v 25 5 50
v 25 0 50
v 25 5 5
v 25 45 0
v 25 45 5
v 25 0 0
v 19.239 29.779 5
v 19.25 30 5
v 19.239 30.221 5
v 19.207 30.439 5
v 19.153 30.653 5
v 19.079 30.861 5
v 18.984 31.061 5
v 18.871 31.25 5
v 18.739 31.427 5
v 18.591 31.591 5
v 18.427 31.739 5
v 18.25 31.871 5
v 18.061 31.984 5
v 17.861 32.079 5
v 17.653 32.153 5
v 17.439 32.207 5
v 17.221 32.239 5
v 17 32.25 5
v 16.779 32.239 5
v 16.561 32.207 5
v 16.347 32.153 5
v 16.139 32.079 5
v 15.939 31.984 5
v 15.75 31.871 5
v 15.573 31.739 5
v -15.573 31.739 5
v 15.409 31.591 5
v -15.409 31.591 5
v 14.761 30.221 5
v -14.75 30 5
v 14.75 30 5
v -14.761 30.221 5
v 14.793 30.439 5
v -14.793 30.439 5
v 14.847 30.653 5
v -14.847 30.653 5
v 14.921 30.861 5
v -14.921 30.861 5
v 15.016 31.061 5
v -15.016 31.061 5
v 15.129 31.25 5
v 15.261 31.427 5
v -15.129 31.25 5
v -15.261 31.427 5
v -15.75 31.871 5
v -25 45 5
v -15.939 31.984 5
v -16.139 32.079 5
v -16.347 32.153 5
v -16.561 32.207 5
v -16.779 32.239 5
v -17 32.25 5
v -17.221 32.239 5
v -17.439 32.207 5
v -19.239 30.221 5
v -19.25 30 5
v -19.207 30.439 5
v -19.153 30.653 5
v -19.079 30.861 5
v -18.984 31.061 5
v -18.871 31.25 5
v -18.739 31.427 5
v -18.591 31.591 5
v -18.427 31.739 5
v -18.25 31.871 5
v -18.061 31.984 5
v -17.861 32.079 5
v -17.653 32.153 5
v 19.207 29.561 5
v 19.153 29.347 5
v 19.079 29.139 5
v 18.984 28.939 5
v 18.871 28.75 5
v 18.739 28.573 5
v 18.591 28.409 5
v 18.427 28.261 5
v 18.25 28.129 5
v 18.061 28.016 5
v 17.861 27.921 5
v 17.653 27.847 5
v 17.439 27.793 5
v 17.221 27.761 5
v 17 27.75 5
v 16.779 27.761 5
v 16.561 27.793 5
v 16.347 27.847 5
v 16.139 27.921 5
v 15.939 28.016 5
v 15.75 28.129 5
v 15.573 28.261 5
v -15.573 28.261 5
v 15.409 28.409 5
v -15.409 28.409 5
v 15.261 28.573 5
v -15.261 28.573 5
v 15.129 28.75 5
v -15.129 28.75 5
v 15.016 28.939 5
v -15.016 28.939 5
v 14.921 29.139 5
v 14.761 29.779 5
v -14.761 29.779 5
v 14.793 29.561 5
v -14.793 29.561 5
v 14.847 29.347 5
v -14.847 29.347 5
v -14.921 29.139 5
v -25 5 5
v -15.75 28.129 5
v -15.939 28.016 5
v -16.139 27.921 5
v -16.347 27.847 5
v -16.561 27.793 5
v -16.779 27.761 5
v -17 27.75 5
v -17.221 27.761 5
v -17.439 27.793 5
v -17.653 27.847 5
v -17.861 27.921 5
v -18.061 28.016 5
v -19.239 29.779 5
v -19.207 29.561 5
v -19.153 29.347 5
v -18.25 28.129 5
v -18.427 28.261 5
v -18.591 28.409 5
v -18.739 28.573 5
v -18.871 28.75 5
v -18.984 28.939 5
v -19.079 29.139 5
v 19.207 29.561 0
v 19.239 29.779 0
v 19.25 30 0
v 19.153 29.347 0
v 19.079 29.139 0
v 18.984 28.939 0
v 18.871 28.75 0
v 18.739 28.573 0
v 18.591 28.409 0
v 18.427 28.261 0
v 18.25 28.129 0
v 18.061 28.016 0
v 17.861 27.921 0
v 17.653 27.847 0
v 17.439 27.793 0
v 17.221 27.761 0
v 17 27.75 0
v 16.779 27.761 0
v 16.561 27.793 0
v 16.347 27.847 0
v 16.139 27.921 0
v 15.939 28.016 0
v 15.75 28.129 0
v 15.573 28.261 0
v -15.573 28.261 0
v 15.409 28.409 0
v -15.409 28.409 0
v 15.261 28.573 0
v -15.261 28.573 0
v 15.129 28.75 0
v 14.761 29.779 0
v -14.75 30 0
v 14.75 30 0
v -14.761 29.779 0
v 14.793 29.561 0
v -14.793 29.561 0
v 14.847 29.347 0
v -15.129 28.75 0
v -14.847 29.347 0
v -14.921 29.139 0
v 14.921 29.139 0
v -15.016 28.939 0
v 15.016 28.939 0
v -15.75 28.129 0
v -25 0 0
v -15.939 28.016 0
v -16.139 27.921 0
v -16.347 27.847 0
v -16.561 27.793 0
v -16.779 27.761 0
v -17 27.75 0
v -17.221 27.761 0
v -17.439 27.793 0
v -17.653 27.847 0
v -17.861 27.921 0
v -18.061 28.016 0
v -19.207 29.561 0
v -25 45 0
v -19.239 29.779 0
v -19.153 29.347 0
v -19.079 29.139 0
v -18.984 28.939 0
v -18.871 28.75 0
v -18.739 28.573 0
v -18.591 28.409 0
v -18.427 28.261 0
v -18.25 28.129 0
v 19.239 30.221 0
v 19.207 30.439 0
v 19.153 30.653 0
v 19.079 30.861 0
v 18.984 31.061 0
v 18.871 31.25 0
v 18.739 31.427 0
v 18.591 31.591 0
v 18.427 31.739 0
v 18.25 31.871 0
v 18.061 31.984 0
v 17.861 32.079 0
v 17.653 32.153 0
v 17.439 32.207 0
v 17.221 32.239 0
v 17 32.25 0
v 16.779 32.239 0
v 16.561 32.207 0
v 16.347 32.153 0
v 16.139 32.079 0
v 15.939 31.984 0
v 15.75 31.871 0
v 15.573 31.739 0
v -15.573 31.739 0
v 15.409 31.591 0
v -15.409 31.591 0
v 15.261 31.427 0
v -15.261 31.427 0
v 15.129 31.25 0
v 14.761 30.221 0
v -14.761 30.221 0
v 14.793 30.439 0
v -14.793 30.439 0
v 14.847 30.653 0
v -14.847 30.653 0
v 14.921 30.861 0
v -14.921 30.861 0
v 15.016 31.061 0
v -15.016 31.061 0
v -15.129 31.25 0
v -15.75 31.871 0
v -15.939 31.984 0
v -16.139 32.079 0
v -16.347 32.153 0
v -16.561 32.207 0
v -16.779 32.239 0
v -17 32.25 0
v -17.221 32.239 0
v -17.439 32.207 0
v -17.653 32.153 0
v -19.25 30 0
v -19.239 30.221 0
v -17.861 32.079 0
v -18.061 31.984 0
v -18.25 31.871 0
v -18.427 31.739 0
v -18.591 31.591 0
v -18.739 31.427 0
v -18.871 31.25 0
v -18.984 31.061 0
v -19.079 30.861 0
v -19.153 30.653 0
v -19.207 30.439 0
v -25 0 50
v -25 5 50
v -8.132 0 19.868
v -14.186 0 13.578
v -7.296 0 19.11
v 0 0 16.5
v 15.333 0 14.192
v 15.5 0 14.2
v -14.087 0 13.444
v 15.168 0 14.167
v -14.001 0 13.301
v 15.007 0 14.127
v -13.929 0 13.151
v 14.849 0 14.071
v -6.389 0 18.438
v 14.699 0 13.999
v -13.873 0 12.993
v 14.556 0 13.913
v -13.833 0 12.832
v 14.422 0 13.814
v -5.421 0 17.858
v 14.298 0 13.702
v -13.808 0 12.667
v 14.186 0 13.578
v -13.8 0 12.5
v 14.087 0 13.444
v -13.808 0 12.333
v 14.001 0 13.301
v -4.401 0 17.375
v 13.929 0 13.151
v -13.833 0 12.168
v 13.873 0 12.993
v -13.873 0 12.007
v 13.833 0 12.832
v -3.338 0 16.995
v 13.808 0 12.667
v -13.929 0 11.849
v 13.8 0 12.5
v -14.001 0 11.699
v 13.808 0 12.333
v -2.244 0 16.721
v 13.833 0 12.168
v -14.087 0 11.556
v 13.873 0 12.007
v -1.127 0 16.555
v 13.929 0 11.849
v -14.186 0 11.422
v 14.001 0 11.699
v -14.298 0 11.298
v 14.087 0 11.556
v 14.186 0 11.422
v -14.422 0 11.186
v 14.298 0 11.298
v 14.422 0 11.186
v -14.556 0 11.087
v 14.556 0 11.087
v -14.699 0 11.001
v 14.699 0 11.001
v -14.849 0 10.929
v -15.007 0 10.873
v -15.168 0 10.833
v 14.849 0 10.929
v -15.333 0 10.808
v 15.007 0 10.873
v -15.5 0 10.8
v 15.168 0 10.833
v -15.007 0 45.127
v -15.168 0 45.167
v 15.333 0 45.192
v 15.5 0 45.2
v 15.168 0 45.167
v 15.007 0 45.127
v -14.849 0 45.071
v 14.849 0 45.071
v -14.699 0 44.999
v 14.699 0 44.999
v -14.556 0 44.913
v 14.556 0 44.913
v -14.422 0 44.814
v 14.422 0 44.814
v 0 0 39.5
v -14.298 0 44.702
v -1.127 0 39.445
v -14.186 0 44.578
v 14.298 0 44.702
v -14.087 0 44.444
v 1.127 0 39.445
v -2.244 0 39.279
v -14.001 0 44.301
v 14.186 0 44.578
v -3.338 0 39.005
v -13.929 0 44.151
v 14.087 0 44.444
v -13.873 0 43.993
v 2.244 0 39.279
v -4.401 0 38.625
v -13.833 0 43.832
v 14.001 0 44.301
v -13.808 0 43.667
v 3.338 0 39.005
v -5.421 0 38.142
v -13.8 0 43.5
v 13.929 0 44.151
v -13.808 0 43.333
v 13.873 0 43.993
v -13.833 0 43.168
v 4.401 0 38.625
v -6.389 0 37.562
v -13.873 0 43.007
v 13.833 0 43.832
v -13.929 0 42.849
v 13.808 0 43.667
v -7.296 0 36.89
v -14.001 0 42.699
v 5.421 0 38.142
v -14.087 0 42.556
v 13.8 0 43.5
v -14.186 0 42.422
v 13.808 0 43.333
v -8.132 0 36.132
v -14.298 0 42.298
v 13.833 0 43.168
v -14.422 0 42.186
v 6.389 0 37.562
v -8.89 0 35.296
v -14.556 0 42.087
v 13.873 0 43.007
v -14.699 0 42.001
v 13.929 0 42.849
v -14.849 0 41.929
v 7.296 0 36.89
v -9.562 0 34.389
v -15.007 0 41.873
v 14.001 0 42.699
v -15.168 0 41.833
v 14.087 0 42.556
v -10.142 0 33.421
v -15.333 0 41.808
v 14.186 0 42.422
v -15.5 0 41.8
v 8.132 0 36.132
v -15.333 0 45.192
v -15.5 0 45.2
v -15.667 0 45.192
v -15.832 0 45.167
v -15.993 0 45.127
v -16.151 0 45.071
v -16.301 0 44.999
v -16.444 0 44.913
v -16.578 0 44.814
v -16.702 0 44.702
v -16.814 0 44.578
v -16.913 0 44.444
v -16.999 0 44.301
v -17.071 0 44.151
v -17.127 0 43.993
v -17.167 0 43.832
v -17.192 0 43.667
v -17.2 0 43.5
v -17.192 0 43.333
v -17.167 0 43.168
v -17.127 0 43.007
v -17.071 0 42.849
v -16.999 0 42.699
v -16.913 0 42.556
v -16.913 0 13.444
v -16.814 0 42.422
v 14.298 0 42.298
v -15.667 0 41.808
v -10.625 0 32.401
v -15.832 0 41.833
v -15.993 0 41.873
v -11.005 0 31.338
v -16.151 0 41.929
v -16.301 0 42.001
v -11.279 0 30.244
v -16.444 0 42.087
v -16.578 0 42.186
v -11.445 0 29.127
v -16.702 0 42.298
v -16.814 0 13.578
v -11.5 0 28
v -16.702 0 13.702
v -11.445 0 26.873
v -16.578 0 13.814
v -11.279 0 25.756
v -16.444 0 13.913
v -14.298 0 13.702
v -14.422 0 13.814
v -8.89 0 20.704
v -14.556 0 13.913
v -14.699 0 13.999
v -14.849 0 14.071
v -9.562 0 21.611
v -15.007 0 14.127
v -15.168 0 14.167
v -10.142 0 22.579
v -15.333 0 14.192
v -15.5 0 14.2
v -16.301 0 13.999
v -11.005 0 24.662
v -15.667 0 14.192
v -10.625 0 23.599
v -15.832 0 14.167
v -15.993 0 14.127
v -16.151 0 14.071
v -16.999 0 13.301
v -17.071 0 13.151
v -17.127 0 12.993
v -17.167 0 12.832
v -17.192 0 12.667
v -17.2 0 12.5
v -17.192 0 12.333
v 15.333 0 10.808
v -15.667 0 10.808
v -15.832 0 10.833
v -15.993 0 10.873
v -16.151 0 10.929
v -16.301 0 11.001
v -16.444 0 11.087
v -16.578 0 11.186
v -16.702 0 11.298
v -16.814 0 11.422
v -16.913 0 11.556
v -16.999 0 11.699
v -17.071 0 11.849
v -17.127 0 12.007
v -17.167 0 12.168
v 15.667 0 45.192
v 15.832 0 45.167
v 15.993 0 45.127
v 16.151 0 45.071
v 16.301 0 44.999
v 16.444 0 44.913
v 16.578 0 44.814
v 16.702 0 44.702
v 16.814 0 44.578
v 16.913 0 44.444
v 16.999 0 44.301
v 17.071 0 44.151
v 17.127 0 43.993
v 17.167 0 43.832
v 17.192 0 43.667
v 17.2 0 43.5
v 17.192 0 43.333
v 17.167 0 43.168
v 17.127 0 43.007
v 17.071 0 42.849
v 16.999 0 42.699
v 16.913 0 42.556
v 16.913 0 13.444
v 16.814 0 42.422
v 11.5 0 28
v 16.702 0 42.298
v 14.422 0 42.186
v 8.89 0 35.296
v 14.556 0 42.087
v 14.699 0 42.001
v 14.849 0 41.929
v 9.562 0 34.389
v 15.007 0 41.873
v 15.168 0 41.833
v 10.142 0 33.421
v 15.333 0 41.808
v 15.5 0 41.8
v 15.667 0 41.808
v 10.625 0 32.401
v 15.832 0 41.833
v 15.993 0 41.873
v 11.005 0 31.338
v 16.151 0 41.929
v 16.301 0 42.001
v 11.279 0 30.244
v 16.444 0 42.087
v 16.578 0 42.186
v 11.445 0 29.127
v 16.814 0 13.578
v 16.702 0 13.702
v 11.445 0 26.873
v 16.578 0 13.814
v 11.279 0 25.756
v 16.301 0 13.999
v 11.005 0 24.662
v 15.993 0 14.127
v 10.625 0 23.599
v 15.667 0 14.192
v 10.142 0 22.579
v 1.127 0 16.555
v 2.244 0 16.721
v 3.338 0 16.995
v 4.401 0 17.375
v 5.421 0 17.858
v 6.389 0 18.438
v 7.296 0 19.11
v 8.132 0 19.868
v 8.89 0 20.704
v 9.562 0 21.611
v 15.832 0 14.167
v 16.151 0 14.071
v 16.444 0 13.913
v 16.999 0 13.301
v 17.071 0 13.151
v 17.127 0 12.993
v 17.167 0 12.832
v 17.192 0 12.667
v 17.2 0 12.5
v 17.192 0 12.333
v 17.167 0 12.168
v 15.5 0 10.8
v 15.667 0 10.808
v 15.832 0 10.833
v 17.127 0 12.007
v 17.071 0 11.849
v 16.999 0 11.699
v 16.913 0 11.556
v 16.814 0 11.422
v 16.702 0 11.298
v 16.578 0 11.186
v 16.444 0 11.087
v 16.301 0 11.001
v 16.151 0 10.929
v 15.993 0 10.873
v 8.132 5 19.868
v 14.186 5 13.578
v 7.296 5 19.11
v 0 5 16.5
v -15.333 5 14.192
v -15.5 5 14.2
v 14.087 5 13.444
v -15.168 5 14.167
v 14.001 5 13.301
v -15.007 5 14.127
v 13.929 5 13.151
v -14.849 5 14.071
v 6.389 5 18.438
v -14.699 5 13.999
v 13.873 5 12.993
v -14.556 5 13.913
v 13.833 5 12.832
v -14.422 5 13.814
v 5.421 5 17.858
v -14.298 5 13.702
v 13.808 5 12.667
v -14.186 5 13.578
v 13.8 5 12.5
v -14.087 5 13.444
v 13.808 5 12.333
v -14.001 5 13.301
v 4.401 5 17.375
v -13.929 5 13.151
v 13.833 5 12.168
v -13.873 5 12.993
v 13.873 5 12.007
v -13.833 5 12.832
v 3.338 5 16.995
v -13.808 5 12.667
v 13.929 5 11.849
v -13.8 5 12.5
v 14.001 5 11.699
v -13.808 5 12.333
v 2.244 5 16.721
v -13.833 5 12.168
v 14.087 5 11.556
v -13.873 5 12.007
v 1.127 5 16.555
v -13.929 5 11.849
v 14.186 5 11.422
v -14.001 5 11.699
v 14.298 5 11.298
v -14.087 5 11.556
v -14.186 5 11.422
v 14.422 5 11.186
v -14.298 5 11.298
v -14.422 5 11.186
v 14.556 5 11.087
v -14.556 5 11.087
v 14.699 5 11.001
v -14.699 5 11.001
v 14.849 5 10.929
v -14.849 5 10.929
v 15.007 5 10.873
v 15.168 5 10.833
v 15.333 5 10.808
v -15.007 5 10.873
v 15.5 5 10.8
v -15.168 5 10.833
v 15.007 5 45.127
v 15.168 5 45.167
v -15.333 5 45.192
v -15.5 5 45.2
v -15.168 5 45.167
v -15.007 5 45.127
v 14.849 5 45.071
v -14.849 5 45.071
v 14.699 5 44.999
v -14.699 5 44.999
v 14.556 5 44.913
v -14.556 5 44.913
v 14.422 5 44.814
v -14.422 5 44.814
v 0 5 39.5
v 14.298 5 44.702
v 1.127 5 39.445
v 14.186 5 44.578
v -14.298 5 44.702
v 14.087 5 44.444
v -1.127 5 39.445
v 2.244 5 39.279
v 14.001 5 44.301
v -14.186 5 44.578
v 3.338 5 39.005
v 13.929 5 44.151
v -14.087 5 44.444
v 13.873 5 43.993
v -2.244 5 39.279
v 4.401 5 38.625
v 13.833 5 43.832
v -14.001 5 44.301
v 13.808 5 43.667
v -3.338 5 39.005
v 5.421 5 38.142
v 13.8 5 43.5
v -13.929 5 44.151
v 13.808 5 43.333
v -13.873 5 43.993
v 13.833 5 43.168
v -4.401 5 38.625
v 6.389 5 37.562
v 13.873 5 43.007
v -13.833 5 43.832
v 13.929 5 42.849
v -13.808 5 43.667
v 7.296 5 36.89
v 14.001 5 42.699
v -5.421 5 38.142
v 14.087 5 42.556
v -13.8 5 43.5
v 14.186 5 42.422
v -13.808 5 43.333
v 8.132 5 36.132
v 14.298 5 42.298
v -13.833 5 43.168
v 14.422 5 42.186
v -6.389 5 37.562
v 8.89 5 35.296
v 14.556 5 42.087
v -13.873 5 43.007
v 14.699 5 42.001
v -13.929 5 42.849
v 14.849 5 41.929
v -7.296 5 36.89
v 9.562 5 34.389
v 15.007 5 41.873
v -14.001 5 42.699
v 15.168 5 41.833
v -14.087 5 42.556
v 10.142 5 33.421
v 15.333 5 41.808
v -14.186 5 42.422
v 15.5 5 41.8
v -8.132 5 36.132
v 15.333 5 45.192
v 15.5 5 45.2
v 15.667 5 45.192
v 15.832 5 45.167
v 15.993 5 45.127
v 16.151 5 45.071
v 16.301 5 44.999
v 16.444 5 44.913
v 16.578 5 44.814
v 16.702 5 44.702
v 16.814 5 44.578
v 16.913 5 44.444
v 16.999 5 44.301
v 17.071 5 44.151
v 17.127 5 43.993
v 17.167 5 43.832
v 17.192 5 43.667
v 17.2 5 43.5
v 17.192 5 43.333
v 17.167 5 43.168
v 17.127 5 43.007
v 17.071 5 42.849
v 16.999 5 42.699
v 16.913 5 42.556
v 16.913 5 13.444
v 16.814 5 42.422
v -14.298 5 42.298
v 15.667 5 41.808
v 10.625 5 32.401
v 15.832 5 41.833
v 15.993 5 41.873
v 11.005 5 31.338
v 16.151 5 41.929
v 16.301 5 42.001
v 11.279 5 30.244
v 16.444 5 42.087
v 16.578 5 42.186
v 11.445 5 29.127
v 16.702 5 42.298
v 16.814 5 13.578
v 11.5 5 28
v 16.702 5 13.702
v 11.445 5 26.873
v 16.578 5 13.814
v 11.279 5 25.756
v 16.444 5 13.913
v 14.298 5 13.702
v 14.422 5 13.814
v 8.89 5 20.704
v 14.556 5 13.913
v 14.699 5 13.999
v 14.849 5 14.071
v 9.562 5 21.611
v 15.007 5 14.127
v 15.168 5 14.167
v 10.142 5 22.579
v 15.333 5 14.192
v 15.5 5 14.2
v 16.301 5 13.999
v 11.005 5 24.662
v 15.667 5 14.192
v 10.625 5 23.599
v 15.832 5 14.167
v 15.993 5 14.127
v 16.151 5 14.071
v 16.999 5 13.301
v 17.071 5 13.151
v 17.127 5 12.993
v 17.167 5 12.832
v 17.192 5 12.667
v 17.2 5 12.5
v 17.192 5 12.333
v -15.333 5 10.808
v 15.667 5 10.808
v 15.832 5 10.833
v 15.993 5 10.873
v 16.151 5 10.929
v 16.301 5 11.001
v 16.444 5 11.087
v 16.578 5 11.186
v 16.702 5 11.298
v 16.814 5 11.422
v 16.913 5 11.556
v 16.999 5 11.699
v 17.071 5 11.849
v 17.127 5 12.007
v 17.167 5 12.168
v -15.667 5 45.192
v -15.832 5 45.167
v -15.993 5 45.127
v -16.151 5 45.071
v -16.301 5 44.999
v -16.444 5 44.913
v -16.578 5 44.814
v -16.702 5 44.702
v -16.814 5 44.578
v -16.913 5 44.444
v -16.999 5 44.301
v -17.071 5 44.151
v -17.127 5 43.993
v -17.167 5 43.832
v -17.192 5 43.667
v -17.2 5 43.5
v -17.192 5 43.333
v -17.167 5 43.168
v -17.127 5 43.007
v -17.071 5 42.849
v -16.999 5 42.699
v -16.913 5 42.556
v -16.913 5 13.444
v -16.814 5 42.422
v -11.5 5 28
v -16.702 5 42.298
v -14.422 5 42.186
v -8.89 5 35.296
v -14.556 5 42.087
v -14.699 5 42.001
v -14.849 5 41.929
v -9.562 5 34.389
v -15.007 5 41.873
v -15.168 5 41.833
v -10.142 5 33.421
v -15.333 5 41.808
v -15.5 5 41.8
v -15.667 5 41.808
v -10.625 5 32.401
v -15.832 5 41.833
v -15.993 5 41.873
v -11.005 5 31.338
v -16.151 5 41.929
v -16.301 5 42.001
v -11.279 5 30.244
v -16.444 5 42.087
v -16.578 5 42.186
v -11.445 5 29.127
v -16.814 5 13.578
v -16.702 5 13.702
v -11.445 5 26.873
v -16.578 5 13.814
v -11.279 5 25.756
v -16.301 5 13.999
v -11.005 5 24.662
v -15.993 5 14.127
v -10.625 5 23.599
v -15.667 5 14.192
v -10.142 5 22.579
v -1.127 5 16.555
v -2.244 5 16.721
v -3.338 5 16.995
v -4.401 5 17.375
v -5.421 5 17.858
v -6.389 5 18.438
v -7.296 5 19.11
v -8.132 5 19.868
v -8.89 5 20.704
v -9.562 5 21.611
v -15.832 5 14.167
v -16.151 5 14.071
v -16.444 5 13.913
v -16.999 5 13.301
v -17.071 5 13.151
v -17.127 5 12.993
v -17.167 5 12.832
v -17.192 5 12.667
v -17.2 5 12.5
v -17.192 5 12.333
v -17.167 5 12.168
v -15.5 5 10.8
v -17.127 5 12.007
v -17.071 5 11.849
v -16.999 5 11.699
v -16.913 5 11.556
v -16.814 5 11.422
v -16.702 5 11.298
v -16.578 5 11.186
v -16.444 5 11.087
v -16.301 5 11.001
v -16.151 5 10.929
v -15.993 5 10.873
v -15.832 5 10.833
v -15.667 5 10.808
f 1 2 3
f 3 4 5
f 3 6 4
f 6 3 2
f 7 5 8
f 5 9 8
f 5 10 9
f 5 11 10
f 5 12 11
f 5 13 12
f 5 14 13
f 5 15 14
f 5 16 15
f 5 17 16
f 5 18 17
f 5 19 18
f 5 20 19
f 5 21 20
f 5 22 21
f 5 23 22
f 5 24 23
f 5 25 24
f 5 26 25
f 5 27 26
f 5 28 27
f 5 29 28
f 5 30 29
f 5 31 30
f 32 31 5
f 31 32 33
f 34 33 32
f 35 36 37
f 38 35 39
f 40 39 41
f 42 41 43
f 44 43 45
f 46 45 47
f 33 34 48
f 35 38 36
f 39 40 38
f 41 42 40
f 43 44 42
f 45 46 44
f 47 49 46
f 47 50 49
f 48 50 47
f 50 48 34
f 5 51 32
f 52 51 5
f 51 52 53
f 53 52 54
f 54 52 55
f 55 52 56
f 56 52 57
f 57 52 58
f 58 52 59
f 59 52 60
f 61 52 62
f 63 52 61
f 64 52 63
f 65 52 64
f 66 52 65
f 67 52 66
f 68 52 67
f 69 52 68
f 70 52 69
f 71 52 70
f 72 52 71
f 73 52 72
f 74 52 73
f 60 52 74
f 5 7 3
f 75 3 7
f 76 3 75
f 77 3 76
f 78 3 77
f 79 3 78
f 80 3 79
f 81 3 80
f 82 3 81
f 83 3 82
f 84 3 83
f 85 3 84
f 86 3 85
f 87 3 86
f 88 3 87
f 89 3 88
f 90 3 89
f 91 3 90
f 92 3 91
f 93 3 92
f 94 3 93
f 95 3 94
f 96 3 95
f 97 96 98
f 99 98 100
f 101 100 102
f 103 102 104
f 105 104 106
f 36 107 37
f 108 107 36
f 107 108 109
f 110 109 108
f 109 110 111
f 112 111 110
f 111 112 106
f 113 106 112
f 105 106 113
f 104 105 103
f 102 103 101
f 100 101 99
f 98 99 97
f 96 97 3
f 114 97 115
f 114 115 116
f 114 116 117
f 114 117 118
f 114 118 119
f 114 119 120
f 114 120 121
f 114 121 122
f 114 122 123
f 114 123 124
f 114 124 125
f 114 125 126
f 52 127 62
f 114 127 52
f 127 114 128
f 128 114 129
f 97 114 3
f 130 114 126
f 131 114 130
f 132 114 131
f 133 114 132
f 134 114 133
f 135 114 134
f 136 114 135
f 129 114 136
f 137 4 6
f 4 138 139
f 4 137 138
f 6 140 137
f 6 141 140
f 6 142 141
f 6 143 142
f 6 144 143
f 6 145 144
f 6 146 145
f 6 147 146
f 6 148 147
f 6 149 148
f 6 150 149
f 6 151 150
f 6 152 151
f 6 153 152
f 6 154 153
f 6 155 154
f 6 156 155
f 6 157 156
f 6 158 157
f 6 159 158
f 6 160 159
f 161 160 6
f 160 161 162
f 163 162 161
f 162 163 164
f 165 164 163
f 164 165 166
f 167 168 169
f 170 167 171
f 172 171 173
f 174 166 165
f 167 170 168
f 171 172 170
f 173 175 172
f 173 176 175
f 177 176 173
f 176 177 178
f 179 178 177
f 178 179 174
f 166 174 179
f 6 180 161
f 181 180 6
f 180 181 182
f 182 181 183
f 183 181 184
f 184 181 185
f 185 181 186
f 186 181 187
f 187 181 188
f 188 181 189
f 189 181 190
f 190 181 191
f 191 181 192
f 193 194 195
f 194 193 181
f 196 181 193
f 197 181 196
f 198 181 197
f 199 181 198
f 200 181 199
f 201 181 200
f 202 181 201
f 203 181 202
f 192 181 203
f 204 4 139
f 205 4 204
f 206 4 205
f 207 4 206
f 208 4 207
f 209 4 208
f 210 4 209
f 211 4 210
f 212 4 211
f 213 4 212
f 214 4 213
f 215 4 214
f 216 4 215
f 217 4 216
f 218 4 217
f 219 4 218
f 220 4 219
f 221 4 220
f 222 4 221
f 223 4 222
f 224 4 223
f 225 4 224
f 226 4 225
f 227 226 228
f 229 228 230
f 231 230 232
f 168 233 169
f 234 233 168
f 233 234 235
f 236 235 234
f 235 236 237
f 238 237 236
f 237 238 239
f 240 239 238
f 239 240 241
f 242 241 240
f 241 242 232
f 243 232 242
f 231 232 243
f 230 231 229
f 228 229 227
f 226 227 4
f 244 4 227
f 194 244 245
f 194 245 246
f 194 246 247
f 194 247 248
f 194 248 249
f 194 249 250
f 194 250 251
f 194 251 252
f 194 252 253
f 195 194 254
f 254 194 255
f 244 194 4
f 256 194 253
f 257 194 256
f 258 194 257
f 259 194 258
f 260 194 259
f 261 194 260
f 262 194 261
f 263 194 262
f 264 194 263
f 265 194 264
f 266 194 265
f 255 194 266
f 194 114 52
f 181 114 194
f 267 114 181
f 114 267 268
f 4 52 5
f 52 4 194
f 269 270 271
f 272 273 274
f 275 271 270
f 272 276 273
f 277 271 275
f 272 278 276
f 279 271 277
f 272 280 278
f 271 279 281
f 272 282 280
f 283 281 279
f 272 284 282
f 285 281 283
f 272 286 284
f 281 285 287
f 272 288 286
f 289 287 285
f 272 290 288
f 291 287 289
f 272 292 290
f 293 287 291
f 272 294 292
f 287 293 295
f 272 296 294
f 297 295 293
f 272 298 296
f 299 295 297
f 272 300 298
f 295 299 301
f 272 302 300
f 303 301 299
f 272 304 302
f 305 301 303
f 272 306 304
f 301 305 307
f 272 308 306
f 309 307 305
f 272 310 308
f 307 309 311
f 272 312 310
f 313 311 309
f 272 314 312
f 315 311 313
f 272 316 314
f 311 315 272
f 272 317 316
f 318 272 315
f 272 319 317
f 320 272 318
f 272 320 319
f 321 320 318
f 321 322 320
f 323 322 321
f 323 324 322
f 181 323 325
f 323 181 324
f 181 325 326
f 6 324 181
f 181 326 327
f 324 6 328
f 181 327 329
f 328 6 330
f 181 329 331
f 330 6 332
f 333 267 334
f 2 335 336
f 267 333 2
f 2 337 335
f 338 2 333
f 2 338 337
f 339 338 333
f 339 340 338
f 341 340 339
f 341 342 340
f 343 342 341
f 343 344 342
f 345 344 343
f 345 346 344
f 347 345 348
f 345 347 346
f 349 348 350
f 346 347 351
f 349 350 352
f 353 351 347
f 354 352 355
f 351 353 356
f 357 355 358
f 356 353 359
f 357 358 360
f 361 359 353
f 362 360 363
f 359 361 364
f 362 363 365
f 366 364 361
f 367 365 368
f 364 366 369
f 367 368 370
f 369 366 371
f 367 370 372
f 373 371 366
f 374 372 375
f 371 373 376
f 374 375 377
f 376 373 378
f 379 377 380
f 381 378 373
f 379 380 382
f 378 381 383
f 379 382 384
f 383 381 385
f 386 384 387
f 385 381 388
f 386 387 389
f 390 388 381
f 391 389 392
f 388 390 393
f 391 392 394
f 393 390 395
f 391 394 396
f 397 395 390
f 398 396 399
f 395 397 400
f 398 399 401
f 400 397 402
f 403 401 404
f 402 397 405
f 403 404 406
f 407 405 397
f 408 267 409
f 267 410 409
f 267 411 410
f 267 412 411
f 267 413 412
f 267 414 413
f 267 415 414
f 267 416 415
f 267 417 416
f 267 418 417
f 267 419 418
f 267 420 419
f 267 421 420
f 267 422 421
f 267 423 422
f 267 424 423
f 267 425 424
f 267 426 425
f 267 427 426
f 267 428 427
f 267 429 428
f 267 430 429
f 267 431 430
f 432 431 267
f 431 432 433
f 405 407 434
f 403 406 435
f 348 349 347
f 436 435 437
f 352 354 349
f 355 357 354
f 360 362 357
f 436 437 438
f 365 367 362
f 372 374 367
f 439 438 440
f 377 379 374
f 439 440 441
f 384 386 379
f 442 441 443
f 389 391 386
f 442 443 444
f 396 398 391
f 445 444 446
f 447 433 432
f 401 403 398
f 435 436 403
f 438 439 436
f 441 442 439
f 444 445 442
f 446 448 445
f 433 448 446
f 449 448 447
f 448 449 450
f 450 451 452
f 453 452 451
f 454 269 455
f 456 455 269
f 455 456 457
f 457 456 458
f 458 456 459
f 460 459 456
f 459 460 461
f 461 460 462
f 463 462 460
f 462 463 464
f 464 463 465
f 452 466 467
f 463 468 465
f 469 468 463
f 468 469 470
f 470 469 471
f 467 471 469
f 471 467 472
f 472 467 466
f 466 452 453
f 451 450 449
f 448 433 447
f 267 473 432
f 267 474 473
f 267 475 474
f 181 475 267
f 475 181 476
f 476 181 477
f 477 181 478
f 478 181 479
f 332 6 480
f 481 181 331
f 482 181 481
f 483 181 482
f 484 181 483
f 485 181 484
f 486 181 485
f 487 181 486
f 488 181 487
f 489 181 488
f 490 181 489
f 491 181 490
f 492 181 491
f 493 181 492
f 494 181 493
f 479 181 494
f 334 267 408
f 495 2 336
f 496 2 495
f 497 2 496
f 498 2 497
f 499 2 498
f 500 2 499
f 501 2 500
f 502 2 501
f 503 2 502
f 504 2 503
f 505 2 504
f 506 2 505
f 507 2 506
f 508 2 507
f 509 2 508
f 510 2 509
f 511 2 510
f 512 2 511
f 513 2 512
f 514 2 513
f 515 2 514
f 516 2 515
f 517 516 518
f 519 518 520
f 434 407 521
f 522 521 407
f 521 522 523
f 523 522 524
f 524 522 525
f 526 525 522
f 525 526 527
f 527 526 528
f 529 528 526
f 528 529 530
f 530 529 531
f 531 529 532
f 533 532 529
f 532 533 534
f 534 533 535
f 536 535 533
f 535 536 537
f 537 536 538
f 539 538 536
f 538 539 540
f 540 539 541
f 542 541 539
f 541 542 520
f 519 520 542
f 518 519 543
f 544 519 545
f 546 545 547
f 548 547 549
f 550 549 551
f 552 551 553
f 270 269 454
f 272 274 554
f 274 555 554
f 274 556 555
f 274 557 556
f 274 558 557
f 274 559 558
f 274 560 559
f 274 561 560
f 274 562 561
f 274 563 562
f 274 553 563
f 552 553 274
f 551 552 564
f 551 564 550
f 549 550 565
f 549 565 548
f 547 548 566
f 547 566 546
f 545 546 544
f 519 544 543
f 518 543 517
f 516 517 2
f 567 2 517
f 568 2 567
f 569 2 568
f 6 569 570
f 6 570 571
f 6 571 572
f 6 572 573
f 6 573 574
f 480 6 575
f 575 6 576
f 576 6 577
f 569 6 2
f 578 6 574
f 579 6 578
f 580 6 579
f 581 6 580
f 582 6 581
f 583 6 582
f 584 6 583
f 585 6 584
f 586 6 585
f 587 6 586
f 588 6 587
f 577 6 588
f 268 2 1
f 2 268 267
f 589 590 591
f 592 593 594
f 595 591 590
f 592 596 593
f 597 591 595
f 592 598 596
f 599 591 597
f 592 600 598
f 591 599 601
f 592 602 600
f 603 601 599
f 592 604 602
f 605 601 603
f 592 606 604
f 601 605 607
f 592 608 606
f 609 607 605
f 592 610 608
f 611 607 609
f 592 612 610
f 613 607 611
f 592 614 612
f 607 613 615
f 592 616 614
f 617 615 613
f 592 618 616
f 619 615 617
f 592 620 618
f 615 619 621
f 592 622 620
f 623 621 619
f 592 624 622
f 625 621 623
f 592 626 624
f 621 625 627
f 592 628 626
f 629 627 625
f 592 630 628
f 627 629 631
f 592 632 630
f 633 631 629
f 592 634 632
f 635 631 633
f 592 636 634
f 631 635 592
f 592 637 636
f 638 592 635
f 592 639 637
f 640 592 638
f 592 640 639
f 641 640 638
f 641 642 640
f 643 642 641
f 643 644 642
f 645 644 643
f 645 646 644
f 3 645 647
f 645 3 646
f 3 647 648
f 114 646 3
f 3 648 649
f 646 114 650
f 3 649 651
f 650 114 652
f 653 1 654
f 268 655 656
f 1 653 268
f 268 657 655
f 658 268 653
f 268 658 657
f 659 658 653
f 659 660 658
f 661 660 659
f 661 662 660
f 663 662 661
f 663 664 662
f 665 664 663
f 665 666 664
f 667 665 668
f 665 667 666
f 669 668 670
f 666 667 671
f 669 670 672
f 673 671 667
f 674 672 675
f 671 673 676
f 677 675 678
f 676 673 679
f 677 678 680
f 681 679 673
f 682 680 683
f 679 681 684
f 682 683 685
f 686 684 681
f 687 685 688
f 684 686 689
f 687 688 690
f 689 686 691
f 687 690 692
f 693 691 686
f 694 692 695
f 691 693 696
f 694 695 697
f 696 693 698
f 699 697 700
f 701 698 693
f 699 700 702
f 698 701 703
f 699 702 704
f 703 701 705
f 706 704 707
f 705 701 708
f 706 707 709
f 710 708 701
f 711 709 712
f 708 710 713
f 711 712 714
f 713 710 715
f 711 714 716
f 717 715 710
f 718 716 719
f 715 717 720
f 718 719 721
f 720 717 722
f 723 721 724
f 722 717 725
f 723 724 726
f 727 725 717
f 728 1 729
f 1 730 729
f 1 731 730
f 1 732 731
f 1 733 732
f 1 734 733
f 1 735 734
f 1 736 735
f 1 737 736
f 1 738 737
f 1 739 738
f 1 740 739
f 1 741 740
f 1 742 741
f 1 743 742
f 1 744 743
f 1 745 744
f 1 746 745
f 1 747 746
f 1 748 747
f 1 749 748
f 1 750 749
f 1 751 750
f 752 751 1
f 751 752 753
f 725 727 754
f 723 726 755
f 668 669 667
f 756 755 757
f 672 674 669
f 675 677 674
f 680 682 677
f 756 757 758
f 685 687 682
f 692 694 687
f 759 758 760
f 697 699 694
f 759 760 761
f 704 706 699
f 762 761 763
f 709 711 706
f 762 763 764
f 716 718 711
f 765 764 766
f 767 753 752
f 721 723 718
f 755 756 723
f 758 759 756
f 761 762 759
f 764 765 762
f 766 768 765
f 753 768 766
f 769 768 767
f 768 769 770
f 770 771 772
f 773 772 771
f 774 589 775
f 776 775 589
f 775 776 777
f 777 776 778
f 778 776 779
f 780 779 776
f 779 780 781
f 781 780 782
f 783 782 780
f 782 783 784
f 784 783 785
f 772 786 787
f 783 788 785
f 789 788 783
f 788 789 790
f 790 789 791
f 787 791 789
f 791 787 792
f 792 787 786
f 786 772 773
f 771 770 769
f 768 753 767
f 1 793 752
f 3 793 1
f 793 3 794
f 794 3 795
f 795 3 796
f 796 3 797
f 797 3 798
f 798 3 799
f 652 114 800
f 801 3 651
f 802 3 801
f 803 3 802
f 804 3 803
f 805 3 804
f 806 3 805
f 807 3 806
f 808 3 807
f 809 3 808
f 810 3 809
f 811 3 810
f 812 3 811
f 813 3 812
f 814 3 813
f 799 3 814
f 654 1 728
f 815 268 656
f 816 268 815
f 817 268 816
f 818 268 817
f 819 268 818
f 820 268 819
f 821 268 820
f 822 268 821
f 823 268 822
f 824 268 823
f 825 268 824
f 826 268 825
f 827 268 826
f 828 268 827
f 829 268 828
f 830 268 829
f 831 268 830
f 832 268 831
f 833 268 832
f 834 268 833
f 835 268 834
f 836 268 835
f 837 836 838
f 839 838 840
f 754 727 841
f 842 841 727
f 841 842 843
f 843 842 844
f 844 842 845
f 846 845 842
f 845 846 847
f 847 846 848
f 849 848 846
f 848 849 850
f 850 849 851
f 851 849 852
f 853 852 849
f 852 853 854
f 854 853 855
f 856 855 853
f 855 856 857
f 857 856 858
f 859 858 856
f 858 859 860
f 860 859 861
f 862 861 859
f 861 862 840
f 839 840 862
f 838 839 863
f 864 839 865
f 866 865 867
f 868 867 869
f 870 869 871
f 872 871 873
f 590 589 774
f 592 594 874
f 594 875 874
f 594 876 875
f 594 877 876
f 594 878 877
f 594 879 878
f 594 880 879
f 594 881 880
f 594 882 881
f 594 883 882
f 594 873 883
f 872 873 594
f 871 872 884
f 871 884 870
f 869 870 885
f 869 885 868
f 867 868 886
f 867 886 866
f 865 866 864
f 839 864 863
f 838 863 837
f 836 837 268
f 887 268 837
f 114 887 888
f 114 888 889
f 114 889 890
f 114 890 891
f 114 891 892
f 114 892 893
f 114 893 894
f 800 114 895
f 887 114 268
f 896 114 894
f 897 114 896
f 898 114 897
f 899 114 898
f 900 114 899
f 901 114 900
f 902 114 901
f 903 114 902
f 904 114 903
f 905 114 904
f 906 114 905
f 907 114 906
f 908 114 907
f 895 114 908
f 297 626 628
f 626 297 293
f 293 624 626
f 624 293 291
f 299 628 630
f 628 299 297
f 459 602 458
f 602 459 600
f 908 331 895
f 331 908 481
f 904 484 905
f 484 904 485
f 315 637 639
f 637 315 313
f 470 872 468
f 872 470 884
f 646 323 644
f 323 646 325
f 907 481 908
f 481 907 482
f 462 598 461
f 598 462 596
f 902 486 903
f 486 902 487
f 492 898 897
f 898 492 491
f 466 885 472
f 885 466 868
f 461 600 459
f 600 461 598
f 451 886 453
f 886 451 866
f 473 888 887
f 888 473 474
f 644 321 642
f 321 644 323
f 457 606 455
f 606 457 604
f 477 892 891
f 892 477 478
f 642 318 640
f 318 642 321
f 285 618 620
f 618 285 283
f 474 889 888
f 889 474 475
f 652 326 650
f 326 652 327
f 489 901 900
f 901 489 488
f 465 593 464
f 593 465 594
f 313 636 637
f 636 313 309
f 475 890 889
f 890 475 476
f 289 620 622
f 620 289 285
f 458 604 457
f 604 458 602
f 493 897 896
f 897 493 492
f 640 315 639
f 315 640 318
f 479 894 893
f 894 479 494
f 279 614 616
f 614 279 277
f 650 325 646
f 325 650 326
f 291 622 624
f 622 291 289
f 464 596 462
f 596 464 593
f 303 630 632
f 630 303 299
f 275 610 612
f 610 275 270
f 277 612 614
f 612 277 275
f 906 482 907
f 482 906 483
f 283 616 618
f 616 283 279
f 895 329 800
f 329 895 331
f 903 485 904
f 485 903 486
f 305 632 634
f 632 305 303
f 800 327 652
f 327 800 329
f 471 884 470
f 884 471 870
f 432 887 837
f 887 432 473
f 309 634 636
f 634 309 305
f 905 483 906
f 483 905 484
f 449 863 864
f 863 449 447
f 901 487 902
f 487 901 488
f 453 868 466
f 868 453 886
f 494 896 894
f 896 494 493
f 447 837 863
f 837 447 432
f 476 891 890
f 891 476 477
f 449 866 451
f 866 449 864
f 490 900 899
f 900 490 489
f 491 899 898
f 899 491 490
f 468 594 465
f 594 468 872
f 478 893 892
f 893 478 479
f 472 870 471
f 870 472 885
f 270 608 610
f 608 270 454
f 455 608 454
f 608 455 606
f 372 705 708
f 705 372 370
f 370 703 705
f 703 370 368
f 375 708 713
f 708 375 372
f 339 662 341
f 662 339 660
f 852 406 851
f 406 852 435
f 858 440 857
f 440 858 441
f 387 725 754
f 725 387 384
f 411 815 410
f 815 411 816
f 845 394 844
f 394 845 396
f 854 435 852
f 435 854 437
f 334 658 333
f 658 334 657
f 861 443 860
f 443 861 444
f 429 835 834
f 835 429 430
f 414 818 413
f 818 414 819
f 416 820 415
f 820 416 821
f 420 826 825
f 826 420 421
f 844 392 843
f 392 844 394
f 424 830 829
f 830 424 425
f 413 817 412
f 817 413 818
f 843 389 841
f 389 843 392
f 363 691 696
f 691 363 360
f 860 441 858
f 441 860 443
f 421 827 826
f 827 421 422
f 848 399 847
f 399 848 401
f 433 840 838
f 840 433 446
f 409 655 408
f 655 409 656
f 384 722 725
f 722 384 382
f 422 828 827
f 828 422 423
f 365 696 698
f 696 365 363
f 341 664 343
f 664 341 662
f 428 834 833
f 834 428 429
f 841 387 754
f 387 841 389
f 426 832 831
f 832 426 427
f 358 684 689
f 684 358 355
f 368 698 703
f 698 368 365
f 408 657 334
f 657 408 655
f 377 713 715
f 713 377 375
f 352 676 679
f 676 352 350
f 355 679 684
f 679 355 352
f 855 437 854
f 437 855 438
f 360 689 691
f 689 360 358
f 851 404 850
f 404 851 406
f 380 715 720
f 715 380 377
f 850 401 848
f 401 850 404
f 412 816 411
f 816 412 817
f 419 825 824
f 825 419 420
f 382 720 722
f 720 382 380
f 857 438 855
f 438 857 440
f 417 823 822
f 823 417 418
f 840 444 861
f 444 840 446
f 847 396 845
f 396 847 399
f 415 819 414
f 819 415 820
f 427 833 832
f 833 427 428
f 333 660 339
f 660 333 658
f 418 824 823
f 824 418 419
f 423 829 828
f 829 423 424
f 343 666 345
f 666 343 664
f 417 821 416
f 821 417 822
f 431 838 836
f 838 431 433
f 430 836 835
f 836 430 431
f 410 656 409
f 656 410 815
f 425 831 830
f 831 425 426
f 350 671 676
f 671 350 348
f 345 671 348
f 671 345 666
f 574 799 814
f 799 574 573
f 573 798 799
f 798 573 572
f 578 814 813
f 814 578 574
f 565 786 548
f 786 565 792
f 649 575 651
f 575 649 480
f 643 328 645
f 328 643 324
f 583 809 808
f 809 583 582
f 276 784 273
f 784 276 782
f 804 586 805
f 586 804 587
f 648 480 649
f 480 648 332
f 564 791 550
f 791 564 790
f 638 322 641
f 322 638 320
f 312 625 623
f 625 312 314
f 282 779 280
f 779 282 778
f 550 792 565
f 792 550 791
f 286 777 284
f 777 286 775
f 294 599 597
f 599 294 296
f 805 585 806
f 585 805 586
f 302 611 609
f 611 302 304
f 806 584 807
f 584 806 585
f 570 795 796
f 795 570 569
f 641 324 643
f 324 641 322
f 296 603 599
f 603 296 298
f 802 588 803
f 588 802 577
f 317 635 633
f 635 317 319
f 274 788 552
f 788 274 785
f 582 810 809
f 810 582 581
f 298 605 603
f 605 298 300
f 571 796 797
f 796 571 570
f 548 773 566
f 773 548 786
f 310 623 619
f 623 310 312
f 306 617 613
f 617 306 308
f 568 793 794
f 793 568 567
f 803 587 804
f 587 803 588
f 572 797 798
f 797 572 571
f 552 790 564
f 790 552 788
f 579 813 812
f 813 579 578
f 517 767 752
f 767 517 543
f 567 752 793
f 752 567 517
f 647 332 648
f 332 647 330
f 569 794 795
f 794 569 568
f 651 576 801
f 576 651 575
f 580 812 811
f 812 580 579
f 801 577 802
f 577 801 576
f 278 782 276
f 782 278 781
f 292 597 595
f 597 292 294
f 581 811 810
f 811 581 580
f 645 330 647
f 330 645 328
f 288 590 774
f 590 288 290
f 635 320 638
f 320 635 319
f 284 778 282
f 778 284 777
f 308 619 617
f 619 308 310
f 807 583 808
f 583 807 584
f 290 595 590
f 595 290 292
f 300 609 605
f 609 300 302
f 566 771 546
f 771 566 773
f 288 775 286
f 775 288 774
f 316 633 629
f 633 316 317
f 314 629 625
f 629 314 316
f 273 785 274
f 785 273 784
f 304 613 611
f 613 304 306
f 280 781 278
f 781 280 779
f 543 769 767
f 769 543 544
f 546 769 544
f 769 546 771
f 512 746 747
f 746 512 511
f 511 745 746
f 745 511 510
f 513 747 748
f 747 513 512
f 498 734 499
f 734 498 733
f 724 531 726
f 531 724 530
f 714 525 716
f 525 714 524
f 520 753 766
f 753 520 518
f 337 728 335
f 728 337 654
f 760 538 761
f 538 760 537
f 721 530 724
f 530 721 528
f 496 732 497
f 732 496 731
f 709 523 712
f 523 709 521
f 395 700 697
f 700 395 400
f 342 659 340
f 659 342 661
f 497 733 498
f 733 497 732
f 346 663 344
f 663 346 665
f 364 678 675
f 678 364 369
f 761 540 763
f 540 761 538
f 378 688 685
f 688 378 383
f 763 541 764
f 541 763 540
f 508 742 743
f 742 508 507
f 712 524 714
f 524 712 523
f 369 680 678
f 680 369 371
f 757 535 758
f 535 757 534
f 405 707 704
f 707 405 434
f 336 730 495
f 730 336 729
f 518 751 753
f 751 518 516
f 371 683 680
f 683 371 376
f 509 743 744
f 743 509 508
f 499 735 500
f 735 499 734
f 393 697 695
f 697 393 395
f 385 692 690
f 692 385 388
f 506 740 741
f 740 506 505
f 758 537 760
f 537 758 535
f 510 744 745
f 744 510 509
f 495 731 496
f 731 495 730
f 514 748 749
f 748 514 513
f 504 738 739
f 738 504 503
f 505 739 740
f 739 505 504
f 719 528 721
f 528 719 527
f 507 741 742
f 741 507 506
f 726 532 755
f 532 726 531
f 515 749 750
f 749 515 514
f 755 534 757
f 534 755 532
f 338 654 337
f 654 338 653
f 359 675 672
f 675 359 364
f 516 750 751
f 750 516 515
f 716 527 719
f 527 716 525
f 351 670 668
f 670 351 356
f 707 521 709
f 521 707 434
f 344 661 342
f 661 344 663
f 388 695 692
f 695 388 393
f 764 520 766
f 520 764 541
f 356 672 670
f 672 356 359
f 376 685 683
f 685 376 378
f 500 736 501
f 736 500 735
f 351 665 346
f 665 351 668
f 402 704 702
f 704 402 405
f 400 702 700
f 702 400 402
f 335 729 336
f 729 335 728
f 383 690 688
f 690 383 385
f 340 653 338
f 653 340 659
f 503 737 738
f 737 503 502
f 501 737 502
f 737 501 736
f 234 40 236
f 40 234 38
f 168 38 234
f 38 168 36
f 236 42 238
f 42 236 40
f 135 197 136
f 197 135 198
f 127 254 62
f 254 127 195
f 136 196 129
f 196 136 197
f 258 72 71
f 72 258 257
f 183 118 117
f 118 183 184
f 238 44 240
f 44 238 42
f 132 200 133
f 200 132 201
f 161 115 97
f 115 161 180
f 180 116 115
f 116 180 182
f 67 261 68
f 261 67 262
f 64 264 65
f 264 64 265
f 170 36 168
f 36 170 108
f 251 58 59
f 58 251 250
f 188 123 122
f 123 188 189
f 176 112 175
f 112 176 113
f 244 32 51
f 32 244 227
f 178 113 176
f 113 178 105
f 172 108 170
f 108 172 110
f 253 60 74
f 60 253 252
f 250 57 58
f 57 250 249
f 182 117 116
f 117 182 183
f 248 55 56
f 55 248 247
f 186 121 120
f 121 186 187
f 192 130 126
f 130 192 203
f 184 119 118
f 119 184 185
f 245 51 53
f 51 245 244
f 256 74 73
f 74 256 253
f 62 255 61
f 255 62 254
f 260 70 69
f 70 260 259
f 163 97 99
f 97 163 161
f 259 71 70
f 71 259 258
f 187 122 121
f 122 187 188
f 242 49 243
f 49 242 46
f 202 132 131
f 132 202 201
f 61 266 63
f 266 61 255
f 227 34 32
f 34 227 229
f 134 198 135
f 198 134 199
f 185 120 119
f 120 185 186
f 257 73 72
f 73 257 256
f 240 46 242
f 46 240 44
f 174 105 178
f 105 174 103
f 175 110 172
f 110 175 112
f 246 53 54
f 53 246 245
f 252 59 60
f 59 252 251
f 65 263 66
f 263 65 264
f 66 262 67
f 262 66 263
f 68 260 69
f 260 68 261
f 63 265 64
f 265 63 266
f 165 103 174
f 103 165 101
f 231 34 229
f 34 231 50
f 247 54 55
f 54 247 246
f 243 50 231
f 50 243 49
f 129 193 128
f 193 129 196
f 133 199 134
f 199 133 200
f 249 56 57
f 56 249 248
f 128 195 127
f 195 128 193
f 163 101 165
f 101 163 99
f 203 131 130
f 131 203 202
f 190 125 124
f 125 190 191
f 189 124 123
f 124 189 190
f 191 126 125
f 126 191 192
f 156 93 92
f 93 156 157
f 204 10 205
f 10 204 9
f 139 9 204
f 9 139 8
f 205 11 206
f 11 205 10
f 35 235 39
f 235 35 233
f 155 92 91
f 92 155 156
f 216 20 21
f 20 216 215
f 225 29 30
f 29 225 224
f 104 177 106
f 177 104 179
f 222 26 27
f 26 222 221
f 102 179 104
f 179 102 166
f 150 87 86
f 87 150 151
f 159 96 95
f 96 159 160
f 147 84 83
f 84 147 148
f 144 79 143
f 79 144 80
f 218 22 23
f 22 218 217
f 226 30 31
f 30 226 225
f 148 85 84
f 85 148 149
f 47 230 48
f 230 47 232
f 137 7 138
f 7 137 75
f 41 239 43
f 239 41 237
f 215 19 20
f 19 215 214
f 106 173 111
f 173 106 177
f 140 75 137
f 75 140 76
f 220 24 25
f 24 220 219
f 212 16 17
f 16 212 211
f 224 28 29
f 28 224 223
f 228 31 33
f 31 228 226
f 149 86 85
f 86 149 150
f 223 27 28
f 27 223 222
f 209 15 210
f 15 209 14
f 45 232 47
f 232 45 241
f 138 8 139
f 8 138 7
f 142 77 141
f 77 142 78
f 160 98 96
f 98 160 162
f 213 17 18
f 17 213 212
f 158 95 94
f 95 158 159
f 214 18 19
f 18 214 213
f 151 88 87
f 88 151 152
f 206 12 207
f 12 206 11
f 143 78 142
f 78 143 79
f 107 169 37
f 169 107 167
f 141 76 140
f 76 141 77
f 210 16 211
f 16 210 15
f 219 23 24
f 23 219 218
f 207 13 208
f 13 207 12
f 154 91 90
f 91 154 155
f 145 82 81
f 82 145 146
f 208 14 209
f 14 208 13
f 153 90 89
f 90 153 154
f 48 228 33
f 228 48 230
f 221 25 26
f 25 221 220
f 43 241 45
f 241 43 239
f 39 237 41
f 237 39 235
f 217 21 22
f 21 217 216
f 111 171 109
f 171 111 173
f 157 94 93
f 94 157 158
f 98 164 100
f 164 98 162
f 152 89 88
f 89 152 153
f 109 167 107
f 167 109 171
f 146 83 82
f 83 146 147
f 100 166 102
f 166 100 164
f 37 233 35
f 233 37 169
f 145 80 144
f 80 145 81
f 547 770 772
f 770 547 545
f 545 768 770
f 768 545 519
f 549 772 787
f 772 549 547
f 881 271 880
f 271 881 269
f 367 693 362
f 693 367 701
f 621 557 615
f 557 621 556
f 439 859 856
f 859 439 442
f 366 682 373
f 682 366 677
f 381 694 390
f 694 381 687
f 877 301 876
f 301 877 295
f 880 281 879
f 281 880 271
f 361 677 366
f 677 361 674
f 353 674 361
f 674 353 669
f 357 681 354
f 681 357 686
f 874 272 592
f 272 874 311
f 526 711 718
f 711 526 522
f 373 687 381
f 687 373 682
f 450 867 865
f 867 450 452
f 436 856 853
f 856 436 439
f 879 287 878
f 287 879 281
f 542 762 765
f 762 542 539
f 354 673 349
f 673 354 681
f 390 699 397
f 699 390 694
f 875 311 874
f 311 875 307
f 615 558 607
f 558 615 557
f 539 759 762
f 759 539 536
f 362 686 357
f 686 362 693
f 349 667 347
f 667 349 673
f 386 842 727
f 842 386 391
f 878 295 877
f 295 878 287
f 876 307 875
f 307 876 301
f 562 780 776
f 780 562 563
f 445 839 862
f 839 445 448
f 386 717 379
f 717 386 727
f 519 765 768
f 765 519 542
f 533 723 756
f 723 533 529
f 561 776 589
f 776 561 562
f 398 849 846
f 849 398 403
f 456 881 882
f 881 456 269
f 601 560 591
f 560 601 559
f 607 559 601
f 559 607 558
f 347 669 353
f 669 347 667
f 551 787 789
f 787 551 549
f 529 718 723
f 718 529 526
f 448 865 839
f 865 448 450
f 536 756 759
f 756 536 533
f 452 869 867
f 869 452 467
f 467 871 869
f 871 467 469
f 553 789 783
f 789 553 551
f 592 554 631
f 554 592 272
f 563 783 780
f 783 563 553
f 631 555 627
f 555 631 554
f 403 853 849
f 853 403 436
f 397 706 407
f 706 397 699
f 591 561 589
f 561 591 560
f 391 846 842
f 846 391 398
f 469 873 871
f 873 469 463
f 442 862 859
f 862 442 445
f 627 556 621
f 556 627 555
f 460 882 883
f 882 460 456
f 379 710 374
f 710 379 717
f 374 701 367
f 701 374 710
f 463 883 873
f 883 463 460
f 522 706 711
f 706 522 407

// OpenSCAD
// Dimensions in mm
base_width = 50;
base_length = 45;
base_thickness = 5;

motor_plate_width = 50;
motor_plate_depth = 5;
motor_plate_height = 50;

mount_hole_dia = 4.5;
mount_hole_1_x = -17;
mount_hole_1_y = 30;
mount_hole_2_x = 17;
mount_hole_2_y = 30;

boss_hole_dia = 23;
boss_hole_x = 0;
boss_hole_z = 28;

screw_hole_dia = 3.4;
screw_pattern_size = 31;

$fn = 64;

difference() {
    // Base shape (union of base plate, motor plate, and gussets)
    union() {
        // Base plate: x = -25 to 25, y = 0 to 45, z = 0 to 5
        translate([-25, 0, 0])
            cube([50, 45, 5]);
        
        // Motor plate: x = -25 to 25, y = 0 to 5, z = 0 to 50
        translate([-25, 0, 0])
            cube([50, 5, 50]);
        
        // Right gusset: x = 20 to 25, triangular prism in YZ plane
        polyhedron(
            points = [
                [20, 5, 5],
                [25, 5, 5],
                [20, 25, 5],
                [25, 25, 5],
                [20, 5, 25],
                [25, 5, 25]
            ],
            faces = [
                [0, 1, 3, 2],
                [0, 1, 5, 4],
                [4, 5, 3, 2],
                [0, 4, 2],
                [1, 3, 5]
            ]
        );
        
        // Left gusset: x = -25 to -20, triangular prism in YZ plane
        polyhedron(
            points = [
                [-25, 5, 5],
                [-20, 5, 5],
                [-25, 25, 5],
                [-20, 25, 5],
                [-25, 5, 25],
                [-20, 5, 25]
            ],
            faces = [
                [0, 1, 3, 2],
                [0, 1, 5, 4],
                [4, 5, 3, 2],
                [0, 4, 2],
                [1, 5, 3]
            ]
        );
    }
    
    // Cut out the holes
    
    // Mount holes on base plate (M4, 4.5 mm diameter, vertical through-holes)
    translate([mount_hole_1_x, mount_hole_1_y, -0.5])
        cylinder(d = mount_hole_dia, h = 6, $fn = 64);
    
    translate([mount_hole_2_x, mount_hole_2_y, -0.5])
        cylinder(d = mount_hole_dia, h = 6, $fn = 64);
    
    // Boss hole on motor plate (23 mm diameter, through along Y)
    translate([boss_hole_x, -0.5, boss_hole_z])
        rotate([-90, 0, 0])
            cylinder(d = boss_hole_dia, h = 6, $fn = 64);
    
    // M3 screw holes (3.4 mm diameter) on 31 mm square pattern centered on boss hole
    for (dx = [-15.5, 15.5]) {
        for (dz = [-15.5, 15.5]) {
            translate([dx, -0.5, 28 + dz])
                rotate([-90, 0, 0])
                    cylinder(d = screw_hole_dia, h = 6, $fn = 64);
        }
    }
}
